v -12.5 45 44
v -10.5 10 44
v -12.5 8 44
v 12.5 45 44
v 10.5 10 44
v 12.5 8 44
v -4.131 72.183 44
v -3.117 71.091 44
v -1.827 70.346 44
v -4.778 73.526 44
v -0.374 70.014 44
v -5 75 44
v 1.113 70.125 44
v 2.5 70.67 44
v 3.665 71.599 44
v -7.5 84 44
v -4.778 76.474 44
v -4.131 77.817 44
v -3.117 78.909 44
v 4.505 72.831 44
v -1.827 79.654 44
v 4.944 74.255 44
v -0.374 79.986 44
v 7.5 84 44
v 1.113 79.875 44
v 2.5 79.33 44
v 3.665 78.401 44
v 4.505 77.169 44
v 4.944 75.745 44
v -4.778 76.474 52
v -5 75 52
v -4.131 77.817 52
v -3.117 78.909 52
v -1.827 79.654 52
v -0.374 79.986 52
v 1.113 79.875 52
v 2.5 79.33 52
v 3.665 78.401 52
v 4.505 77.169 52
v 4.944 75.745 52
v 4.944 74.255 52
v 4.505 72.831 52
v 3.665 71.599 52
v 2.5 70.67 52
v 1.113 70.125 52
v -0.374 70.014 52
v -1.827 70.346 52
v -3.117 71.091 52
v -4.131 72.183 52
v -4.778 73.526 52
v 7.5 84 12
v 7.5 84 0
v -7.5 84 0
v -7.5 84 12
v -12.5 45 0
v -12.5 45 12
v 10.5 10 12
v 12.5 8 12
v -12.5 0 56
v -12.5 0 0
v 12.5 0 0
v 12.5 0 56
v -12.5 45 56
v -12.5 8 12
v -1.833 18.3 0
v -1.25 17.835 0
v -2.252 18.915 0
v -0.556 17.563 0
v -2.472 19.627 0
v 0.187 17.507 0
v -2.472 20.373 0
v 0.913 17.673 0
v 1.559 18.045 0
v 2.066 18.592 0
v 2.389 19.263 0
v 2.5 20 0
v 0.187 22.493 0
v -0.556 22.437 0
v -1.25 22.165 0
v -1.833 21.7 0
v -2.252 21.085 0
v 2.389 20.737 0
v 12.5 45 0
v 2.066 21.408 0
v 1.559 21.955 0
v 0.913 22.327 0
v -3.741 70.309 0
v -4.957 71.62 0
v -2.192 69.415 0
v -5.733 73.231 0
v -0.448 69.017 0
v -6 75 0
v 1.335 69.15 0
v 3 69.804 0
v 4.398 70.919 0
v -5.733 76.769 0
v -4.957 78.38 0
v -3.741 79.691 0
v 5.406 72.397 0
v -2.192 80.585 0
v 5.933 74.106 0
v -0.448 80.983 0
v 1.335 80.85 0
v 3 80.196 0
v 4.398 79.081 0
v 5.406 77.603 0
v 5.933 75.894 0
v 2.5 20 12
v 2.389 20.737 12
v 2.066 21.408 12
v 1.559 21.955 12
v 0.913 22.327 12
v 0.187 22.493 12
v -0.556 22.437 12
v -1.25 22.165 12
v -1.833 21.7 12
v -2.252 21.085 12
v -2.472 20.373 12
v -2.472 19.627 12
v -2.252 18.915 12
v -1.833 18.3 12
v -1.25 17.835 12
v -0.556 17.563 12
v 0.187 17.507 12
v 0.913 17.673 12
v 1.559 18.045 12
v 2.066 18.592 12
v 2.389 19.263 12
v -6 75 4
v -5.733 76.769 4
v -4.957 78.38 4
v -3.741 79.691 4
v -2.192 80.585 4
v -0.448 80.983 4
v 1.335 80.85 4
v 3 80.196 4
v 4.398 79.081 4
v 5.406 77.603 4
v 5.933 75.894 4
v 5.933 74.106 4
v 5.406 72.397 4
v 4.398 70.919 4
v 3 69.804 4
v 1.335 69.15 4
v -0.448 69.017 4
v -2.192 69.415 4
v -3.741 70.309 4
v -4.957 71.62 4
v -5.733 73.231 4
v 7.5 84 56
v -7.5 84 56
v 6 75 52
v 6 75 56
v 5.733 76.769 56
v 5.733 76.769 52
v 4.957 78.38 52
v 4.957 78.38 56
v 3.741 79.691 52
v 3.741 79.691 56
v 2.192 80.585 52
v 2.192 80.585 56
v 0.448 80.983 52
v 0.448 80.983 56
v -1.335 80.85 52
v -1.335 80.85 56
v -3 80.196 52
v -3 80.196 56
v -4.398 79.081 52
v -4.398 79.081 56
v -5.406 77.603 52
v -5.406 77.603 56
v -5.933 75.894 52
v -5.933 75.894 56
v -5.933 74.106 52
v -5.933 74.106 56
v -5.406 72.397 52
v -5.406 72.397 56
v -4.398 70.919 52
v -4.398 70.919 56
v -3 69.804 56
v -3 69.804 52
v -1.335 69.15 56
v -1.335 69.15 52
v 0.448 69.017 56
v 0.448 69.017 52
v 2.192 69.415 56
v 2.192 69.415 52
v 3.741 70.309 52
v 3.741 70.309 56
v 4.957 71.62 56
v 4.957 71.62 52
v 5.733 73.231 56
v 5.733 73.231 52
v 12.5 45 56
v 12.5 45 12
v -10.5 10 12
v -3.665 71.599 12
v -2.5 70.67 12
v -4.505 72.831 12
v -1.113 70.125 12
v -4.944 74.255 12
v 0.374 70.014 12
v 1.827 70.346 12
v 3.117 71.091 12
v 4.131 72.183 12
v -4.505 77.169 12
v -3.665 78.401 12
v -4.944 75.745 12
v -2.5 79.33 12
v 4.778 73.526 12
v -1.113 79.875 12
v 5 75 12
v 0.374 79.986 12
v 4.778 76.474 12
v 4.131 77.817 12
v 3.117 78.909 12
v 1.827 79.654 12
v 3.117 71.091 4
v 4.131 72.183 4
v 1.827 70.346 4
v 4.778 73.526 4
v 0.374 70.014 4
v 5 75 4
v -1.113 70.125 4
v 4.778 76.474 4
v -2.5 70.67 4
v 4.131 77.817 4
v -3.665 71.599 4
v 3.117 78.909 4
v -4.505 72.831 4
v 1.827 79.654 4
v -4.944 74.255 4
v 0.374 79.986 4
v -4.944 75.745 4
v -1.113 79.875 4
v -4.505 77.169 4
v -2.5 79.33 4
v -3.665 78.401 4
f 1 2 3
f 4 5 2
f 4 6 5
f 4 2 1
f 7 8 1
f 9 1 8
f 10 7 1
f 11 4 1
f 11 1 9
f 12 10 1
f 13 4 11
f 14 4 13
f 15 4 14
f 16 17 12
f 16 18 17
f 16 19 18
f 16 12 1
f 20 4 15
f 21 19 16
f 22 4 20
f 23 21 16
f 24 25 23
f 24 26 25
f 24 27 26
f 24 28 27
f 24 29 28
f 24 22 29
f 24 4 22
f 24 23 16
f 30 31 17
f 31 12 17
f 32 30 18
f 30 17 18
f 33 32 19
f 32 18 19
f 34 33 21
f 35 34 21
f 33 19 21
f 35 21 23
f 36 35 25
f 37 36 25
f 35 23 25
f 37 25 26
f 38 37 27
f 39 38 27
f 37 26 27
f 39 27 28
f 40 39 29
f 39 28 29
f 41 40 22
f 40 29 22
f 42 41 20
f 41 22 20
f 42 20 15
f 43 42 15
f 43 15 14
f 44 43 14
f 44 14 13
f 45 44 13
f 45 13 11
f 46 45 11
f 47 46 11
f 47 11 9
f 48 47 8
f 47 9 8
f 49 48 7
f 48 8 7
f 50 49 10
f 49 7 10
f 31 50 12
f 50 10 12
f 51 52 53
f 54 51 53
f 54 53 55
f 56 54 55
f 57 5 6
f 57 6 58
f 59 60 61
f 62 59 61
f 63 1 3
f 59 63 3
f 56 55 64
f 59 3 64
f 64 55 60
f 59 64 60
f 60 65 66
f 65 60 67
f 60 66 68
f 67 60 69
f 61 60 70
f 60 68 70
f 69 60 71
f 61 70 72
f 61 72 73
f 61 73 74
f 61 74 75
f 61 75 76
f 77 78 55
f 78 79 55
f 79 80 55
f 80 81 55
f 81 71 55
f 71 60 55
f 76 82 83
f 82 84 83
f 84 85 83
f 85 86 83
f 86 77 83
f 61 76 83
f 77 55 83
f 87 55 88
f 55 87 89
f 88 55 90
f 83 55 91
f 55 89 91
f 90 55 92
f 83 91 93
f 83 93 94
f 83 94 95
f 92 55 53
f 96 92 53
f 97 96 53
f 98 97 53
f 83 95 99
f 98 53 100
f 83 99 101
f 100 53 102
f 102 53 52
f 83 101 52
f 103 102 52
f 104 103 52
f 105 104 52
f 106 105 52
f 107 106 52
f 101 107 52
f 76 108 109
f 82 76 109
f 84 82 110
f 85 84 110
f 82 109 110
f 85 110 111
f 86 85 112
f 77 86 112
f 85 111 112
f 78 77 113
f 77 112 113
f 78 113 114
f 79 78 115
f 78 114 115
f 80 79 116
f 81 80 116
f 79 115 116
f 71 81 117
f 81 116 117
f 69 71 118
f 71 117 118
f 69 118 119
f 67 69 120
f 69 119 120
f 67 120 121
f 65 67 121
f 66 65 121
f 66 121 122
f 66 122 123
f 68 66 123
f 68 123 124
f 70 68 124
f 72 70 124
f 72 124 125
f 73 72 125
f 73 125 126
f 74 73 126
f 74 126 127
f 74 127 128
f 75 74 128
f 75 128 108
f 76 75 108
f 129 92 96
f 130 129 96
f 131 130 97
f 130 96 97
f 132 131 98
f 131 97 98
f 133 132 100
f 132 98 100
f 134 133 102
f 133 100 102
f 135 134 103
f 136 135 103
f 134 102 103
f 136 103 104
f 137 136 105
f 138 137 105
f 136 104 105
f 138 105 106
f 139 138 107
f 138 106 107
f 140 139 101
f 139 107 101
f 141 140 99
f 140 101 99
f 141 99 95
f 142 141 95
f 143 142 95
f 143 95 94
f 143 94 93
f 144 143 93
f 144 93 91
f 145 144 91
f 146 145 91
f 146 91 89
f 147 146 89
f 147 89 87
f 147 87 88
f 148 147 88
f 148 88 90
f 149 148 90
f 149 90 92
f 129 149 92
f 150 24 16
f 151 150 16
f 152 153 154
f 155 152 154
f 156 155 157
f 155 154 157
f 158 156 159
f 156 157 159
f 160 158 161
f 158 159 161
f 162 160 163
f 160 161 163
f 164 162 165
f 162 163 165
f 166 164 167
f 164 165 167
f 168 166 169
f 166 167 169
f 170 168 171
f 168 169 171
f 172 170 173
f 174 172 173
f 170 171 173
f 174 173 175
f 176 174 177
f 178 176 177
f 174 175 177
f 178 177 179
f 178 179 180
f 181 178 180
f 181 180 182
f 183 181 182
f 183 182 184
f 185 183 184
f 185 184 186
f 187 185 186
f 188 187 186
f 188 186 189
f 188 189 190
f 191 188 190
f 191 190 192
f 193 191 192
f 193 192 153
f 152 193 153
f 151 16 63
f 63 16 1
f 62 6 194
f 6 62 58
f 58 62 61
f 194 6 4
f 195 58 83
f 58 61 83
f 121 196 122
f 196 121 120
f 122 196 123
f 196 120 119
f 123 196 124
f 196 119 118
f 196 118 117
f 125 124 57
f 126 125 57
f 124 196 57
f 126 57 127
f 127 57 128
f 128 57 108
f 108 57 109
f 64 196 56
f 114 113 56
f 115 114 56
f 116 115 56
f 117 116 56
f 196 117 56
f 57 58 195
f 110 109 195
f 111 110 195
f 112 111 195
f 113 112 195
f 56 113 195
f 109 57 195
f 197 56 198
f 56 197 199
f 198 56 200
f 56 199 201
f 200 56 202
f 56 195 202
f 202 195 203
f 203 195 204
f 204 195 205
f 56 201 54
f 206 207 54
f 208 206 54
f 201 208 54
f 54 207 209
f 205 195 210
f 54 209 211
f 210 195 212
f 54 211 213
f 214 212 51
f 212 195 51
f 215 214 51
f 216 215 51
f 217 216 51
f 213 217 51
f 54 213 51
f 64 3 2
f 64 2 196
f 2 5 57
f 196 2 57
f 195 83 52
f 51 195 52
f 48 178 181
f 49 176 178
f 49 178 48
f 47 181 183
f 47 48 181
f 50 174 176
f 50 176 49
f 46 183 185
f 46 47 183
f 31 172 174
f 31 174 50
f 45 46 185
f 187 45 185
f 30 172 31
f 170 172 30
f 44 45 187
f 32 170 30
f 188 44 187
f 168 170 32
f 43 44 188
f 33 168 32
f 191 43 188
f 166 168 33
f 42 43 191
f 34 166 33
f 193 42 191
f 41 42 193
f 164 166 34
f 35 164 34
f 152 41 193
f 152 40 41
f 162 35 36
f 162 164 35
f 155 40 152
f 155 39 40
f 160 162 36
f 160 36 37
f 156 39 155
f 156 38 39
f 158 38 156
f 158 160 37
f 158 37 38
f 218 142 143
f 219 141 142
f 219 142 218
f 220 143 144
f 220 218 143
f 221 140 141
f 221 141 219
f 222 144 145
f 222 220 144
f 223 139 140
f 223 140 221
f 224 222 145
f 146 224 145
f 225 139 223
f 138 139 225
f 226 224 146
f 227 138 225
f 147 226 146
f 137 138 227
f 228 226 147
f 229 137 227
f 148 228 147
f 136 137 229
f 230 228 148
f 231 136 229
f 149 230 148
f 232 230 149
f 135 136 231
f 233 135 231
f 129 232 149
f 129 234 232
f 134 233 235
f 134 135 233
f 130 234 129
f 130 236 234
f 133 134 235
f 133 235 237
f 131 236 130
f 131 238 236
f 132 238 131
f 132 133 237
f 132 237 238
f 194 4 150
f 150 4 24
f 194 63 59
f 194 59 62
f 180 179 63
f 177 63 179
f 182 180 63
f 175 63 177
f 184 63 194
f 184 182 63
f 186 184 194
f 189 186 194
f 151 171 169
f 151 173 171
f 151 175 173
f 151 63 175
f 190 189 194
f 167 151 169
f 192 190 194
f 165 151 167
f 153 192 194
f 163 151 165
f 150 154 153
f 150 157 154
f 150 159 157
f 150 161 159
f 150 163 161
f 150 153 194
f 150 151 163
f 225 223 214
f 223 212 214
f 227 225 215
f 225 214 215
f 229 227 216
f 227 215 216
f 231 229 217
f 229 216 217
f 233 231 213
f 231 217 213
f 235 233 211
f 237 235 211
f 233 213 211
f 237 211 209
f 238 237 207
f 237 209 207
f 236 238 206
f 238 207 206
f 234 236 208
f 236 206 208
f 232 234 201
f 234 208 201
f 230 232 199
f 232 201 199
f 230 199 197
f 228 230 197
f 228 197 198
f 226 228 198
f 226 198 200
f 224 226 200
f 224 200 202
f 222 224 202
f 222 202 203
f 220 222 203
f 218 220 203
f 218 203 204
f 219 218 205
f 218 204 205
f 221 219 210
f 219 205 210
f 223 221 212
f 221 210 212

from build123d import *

# Parameters (mm, degrees)
BOSS_EXTRUDE1_DEPTH                     = 56
SKETCH2_W                               = 32
SKETCH2_H                               = 74
CUT_EXTRUDE1_DEPTH                      = 56
CHAMFER1_SIZE                           = 2
CBORE_FOR_M6_HEX_HEAD_BOLT1_D           = 10
CBORE_FOR_M6_HEX_HEAD_BOLT1_DEPTH       = 20
CBORE_FOR_M6_HEX_HEAD_BOLT1_CBORE_D     = 12
CBORE_FOR_M6_HEX_HEAD_BOLT1_CBORE_DEPTH = 4
CBORE_FOR_M6_HEX_HEAD_BOLT1_TIP         = 3.004303095
CBORE_FOR_M6_HEX_HEAD_BOLT3_D           = 10
CBORE_FOR_M6_HEX_HEAD_BOLT3_DEPTH       = 20
CBORE_FOR_M6_HEX_HEAD_BOLT3_CBORE_D     = 12
CBORE_FOR_M6_HEX_HEAD_BOLT3_CBORE_DEPTH = 4
CBORE_FOR_M6_HEX_HEAD_BOLT3_TIP         = 3.004303095
M6X1_0_TAPPED_HOLE1_D                   = 5
M6X1_0_TAPPED_HOLE1_DEPTH               = 27
M6X1_0_TAPPED_HOLE1_TIP                 = 1.502151548


with BuildPart() as part:
    # Sketch1 → Boss-Extrude1 (new body)
    with BuildSketch(Plane.XY):
        Polygon((0, 0), (12.5, 0), (12.5, 45), (7.5, 84), (-7.5, 84), (-12.5, 45), (-12.5, 0), align=None)
    extrude(amount=BOSS_EXTRUDE1_DEPTH)

    # Sketch2 → Cut-Extrude1 (cut)
    with BuildSketch(Plane(origin=(12.5, 0, 0), x_dir=(0, 0, -1), z_dir=(1, 0, 0))):
        with Locations((-28, 47)):
            Rectangle(SKETCH2_W, SKETCH2_H)
    extrude(amount=-CUT_EXTRUDE1_DEPTH, mode=Mode.SUBTRACT)

    # Chamfer1
    chamfer1_edges = [part.edges().sort_by_distance(p)[0] for p in [
        (-12.5, 10, 28),
        (12.5, 10, 28),
    ]]
    chamfer(chamfer1_edges, length=CHAMFER1_SIZE)

    # CBORE for M6 Hex Head Bolt1
    with Locations(Plane.XY.offset(56)):
        with Locations((0, 75)):
            CounterBoreHole(CBORE_FOR_M6_HEX_HEAD_BOLT1_D / 2, CBORE_FOR_M6_HEX_HEAD_BOLT1_CBORE_D / 2, CBORE_FOR_M6_HEX_HEAD_BOLT1_CBORE_DEPTH, depth=CBORE_FOR_M6_HEX_HEAD_BOLT1_DEPTH)
            with Locations((0, 0, -(CBORE_FOR_M6_HEX_HEAD_BOLT1_DEPTH + CBORE_FOR_M6_HEX_HEAD_BOLT1_TIP / 2))):  # 118° drill point
                Cone(0, CBORE_FOR_M6_HEX_HEAD_BOLT1_D / 2, CBORE_FOR_M6_HEX_HEAD_BOLT1_TIP, mode=Mode.SUBTRACT)

    # CBORE for M6 Hex Head Bolt3
    with Locations(Plane(origin=(0, 0, 0), x_dir=(-1, 0, 0), z_dir=(0, 0, -1))):
        with Locations((0, 75)):
            CounterBoreHole(CBORE_FOR_M6_HEX_HEAD_BOLT3_D / 2, CBORE_FOR_M6_HEX_HEAD_BOLT3_CBORE_D / 2, CBORE_FOR_M6_HEX_HEAD_BOLT3_CBORE_DEPTH, depth=CBORE_FOR_M6_HEX_HEAD_BOLT3_DEPTH)
            with Locations((0, 0, -(CBORE_FOR_M6_HEX_HEAD_BOLT3_DEPTH + CBORE_FOR_M6_HEX_HEAD_BOLT3_TIP / 2))):  # 118° drill point
                Cone(0, CBORE_FOR_M6_HEX_HEAD_BOLT3_D / 2, CBORE_FOR_M6_HEX_HEAD_BOLT3_TIP, mode=Mode.SUBTRACT)

    # M6x1.0 Tapped Hole1
    with Locations(Plane(origin=(0, 20, 0), x_dir=(-1, 0, 0), z_dir=(0, 0, -1))):
        with Locations((0, 0)):
            Hole(M6X1_0_TAPPED_HOLE1_D / 2, depth=M6X1_0_TAPPED_HOLE1_DEPTH)
            with Locations((0, 0, -(M6X1_0_TAPPED_HOLE1_DEPTH + M6X1_0_TAPPED_HOLE1_TIP / 2))):  # 118° drill point
                Cone(0, M6X1_0_TAPPED_HOLE1_D / 2, M6X1_0_TAPPED_HOLE1_TIP, mode=Mode.SUBTRACT)


solid = part.part
